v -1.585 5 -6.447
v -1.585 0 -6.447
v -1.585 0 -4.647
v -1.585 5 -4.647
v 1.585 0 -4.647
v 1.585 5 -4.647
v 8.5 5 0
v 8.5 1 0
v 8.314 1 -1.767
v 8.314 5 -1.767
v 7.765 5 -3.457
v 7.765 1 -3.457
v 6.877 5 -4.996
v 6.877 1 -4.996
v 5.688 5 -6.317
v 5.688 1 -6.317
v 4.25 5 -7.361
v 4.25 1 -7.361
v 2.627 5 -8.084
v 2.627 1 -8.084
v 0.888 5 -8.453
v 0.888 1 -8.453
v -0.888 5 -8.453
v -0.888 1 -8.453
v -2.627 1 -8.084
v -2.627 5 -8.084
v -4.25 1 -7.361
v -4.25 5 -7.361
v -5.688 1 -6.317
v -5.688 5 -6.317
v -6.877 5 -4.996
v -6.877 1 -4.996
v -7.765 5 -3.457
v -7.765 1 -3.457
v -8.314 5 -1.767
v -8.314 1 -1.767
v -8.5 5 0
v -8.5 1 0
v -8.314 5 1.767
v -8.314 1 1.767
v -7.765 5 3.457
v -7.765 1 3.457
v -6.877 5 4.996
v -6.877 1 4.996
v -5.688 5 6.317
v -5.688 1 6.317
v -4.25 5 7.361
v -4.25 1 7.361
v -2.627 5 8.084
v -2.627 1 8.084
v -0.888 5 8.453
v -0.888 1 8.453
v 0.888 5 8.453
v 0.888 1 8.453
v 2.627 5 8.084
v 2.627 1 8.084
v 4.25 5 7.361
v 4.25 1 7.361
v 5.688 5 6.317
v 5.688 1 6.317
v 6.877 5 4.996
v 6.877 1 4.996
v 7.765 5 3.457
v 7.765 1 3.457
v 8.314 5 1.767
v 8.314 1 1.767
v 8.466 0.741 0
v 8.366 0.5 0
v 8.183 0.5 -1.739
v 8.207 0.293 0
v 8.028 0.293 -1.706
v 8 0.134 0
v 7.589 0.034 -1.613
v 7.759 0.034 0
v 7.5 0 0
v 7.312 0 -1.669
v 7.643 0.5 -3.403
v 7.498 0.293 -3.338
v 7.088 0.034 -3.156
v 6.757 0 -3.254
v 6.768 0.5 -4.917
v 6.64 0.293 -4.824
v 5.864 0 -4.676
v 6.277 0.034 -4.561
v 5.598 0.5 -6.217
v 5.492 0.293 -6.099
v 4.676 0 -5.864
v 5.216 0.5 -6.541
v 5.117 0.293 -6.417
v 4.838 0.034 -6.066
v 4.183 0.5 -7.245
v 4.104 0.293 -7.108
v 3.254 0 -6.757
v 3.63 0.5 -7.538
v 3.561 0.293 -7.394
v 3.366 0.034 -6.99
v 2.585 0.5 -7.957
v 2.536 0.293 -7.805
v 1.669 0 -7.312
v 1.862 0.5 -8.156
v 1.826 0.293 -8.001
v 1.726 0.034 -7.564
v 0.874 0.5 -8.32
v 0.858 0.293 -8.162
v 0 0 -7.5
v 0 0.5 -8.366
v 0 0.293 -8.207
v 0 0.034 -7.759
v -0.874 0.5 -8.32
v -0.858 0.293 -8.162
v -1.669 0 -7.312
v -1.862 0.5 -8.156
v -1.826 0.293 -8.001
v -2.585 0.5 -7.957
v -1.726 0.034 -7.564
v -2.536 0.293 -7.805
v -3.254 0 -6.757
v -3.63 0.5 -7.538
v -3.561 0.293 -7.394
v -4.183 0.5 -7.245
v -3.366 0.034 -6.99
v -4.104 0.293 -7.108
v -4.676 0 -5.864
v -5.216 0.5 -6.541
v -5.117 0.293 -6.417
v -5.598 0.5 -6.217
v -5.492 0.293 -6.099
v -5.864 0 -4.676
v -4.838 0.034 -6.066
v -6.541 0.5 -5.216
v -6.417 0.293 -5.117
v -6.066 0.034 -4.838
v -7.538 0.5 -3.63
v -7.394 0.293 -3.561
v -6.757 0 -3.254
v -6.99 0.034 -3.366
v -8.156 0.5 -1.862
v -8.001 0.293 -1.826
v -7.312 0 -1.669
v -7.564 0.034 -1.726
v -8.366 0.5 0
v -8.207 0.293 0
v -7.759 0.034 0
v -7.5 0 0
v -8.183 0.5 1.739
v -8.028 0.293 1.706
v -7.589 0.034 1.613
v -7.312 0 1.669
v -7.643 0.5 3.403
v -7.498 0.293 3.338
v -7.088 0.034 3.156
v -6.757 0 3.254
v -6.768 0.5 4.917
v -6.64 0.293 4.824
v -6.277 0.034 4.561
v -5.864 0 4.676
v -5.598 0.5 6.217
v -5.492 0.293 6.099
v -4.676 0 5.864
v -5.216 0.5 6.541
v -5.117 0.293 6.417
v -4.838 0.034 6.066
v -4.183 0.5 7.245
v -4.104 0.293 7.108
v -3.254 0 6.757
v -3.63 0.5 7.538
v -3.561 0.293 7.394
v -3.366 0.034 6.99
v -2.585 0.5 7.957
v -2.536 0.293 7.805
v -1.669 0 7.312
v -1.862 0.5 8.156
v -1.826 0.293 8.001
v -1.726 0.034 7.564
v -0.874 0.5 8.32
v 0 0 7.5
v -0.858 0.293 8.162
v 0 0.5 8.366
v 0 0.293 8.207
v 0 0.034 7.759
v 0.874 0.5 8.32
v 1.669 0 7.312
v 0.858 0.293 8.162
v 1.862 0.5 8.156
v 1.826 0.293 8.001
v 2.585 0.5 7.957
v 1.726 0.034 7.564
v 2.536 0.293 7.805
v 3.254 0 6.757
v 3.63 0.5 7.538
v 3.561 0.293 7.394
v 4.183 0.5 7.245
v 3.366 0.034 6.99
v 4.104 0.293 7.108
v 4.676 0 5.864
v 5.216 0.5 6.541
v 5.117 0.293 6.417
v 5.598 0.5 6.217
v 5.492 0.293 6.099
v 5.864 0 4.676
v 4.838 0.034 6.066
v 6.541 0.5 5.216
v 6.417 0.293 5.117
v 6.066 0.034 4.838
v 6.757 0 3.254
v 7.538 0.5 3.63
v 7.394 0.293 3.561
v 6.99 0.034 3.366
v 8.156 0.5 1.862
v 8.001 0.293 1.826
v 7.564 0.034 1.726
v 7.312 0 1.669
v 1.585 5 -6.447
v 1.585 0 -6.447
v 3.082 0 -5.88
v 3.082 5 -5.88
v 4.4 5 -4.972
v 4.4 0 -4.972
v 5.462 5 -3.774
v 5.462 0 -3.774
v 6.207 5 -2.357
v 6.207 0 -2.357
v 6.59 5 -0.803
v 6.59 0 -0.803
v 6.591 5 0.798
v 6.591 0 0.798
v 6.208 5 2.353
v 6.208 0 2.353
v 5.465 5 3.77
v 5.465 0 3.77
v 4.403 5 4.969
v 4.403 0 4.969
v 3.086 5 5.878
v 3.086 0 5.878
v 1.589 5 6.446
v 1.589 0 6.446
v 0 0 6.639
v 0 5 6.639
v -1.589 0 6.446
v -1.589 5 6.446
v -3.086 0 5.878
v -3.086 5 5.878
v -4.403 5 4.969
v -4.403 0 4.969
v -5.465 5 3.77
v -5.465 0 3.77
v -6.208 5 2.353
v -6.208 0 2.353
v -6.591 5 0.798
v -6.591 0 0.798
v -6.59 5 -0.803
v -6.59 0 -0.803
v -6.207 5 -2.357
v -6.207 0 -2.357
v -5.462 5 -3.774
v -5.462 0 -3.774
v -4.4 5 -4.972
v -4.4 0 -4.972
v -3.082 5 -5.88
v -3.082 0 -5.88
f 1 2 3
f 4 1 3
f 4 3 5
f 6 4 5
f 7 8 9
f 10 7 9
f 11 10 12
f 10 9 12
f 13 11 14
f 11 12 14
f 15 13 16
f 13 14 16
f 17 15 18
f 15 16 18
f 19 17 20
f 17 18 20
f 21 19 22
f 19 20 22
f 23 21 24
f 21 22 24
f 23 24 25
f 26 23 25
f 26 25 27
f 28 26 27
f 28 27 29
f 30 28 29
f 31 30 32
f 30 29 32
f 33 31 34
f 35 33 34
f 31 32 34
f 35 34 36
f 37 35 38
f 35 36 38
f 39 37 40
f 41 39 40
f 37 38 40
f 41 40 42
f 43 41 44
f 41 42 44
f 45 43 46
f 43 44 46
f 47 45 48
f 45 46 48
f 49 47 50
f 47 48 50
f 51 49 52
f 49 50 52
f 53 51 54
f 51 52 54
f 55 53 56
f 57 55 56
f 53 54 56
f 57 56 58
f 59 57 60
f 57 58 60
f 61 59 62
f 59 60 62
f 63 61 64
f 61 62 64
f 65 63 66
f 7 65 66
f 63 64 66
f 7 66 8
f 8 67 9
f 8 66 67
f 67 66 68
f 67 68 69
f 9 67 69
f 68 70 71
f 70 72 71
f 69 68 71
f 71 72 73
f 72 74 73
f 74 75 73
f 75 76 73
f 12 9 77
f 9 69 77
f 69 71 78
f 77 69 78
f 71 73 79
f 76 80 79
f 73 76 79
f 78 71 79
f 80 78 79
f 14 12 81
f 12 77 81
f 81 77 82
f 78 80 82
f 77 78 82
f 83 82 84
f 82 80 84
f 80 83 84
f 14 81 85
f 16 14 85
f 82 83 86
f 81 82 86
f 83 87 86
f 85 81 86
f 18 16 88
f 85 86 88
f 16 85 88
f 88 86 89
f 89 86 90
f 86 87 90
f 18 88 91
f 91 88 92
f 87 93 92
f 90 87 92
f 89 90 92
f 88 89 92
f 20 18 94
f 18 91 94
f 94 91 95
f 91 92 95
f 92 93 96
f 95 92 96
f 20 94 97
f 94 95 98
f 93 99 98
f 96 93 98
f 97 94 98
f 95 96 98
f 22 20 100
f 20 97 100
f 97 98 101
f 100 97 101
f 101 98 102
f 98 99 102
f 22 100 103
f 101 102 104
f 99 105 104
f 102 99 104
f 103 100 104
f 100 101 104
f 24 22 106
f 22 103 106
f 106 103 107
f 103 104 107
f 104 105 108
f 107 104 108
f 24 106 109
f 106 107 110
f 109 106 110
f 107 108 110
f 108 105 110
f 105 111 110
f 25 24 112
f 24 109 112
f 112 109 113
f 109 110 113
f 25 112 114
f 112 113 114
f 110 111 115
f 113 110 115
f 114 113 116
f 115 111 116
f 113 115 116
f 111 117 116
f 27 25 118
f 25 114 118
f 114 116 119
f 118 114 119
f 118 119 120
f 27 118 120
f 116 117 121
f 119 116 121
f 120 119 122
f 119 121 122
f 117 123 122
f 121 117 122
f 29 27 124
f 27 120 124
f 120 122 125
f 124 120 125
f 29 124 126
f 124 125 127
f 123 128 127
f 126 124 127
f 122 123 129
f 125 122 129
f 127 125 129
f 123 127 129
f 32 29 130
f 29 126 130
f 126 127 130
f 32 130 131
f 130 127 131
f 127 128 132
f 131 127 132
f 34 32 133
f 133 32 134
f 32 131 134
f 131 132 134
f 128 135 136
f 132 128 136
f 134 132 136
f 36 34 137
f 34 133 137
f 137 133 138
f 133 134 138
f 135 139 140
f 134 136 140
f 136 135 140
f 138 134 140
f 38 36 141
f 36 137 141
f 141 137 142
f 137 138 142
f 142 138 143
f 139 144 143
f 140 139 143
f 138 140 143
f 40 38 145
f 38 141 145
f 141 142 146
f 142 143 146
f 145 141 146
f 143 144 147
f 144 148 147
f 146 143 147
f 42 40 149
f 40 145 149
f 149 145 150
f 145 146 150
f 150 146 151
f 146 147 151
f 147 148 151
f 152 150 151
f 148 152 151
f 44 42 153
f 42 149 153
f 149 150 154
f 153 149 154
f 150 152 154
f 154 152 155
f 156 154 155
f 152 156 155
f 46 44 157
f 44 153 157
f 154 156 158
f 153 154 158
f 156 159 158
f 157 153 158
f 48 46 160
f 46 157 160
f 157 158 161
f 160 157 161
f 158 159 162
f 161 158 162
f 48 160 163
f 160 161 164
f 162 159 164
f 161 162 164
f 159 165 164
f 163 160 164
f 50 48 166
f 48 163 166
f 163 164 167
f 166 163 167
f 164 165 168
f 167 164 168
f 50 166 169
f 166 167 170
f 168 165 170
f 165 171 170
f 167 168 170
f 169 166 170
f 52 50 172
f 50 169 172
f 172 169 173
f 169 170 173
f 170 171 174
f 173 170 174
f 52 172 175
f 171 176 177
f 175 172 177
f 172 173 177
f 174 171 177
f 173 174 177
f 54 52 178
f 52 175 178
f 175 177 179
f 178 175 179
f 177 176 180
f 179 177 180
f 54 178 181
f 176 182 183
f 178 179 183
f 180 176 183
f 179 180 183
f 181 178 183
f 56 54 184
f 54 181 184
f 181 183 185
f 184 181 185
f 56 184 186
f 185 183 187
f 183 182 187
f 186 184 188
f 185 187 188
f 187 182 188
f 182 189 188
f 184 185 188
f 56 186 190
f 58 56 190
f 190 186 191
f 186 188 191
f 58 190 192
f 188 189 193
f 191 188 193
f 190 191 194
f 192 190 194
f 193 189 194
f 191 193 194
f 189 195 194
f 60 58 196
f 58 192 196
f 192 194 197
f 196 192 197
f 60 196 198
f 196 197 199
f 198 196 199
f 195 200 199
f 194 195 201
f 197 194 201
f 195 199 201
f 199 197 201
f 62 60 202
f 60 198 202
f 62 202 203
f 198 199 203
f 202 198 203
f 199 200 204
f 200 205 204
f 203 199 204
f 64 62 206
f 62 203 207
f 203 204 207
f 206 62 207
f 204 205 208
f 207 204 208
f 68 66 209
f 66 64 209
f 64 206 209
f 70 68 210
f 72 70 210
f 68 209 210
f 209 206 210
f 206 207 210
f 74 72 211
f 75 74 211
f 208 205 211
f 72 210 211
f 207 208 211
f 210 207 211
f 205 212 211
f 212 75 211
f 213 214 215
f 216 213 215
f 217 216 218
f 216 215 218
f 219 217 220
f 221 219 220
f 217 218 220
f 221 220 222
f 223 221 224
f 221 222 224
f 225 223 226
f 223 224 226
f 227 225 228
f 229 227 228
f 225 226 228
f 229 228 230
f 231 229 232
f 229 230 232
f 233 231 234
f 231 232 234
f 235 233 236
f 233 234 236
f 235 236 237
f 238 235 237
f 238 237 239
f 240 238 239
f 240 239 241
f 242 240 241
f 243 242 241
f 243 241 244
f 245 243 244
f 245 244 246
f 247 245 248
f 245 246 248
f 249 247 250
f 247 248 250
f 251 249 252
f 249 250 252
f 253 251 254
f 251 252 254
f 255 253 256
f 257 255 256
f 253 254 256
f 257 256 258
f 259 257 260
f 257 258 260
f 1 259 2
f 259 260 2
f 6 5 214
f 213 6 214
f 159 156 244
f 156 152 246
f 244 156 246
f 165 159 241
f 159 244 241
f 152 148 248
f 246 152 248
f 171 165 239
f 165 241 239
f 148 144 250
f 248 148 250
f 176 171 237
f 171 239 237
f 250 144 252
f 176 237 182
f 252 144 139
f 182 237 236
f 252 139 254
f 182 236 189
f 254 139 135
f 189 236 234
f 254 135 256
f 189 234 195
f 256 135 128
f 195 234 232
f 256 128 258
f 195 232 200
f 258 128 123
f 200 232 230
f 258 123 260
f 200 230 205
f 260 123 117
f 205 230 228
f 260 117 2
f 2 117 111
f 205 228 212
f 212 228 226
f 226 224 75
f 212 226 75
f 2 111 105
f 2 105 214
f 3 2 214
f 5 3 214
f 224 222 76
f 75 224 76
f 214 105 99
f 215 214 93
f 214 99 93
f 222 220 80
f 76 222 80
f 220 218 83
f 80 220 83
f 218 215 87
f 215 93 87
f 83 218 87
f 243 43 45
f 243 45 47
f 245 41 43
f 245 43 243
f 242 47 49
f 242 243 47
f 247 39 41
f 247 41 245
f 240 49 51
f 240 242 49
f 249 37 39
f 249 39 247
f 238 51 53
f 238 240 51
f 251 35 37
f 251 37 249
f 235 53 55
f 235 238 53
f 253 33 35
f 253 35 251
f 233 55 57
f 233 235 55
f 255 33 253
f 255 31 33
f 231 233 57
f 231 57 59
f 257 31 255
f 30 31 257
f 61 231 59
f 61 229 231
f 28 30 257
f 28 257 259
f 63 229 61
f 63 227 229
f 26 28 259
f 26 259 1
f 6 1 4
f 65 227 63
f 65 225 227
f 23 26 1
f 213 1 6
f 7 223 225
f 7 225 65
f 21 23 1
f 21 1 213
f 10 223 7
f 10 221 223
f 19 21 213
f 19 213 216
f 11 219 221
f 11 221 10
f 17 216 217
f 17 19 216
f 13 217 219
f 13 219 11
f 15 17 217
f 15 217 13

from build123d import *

# Parameters (mm, degrees)
SKETCH1_R           = 8.5
BOSS_EXTRUDE1_DEPTH = 5
FILLET3_R           = 1


with BuildPart() as part:
    # Sketch1 → Boss-Extrude1 (new body)
    with BuildSketch(Plane(origin=(0, 0, 0), x_dir=(1, 0, 0), z_dir=(0, 1, 0))):
        Circle(SKETCH1_R)
        with BuildLine():
            Line((-1.585, 6.447022258), (-1.585, 4.647022258))
            Line((-1.585, 4.647022258), (1.585, 4.647022258))
            Line((1.585, 4.647022258), (1.585, 6.447022258))
            ThreePointArc((1.585, 6.447022258), (0, -6.639), (-1.585, 6.447022258))
        make_face(mode=Mode.SUBTRACT)
    extrude(amount=BOSS_EXTRUDE1_DEPTH)

    # Fillet3
    fillet3_edges = [part.edges().sort_by_distance(p)[0] for p in [
        (-8.5, 0, 0),
    ]]
    fillet(fillet3_edges, radius=FILLET3_R)


solid = part.part
